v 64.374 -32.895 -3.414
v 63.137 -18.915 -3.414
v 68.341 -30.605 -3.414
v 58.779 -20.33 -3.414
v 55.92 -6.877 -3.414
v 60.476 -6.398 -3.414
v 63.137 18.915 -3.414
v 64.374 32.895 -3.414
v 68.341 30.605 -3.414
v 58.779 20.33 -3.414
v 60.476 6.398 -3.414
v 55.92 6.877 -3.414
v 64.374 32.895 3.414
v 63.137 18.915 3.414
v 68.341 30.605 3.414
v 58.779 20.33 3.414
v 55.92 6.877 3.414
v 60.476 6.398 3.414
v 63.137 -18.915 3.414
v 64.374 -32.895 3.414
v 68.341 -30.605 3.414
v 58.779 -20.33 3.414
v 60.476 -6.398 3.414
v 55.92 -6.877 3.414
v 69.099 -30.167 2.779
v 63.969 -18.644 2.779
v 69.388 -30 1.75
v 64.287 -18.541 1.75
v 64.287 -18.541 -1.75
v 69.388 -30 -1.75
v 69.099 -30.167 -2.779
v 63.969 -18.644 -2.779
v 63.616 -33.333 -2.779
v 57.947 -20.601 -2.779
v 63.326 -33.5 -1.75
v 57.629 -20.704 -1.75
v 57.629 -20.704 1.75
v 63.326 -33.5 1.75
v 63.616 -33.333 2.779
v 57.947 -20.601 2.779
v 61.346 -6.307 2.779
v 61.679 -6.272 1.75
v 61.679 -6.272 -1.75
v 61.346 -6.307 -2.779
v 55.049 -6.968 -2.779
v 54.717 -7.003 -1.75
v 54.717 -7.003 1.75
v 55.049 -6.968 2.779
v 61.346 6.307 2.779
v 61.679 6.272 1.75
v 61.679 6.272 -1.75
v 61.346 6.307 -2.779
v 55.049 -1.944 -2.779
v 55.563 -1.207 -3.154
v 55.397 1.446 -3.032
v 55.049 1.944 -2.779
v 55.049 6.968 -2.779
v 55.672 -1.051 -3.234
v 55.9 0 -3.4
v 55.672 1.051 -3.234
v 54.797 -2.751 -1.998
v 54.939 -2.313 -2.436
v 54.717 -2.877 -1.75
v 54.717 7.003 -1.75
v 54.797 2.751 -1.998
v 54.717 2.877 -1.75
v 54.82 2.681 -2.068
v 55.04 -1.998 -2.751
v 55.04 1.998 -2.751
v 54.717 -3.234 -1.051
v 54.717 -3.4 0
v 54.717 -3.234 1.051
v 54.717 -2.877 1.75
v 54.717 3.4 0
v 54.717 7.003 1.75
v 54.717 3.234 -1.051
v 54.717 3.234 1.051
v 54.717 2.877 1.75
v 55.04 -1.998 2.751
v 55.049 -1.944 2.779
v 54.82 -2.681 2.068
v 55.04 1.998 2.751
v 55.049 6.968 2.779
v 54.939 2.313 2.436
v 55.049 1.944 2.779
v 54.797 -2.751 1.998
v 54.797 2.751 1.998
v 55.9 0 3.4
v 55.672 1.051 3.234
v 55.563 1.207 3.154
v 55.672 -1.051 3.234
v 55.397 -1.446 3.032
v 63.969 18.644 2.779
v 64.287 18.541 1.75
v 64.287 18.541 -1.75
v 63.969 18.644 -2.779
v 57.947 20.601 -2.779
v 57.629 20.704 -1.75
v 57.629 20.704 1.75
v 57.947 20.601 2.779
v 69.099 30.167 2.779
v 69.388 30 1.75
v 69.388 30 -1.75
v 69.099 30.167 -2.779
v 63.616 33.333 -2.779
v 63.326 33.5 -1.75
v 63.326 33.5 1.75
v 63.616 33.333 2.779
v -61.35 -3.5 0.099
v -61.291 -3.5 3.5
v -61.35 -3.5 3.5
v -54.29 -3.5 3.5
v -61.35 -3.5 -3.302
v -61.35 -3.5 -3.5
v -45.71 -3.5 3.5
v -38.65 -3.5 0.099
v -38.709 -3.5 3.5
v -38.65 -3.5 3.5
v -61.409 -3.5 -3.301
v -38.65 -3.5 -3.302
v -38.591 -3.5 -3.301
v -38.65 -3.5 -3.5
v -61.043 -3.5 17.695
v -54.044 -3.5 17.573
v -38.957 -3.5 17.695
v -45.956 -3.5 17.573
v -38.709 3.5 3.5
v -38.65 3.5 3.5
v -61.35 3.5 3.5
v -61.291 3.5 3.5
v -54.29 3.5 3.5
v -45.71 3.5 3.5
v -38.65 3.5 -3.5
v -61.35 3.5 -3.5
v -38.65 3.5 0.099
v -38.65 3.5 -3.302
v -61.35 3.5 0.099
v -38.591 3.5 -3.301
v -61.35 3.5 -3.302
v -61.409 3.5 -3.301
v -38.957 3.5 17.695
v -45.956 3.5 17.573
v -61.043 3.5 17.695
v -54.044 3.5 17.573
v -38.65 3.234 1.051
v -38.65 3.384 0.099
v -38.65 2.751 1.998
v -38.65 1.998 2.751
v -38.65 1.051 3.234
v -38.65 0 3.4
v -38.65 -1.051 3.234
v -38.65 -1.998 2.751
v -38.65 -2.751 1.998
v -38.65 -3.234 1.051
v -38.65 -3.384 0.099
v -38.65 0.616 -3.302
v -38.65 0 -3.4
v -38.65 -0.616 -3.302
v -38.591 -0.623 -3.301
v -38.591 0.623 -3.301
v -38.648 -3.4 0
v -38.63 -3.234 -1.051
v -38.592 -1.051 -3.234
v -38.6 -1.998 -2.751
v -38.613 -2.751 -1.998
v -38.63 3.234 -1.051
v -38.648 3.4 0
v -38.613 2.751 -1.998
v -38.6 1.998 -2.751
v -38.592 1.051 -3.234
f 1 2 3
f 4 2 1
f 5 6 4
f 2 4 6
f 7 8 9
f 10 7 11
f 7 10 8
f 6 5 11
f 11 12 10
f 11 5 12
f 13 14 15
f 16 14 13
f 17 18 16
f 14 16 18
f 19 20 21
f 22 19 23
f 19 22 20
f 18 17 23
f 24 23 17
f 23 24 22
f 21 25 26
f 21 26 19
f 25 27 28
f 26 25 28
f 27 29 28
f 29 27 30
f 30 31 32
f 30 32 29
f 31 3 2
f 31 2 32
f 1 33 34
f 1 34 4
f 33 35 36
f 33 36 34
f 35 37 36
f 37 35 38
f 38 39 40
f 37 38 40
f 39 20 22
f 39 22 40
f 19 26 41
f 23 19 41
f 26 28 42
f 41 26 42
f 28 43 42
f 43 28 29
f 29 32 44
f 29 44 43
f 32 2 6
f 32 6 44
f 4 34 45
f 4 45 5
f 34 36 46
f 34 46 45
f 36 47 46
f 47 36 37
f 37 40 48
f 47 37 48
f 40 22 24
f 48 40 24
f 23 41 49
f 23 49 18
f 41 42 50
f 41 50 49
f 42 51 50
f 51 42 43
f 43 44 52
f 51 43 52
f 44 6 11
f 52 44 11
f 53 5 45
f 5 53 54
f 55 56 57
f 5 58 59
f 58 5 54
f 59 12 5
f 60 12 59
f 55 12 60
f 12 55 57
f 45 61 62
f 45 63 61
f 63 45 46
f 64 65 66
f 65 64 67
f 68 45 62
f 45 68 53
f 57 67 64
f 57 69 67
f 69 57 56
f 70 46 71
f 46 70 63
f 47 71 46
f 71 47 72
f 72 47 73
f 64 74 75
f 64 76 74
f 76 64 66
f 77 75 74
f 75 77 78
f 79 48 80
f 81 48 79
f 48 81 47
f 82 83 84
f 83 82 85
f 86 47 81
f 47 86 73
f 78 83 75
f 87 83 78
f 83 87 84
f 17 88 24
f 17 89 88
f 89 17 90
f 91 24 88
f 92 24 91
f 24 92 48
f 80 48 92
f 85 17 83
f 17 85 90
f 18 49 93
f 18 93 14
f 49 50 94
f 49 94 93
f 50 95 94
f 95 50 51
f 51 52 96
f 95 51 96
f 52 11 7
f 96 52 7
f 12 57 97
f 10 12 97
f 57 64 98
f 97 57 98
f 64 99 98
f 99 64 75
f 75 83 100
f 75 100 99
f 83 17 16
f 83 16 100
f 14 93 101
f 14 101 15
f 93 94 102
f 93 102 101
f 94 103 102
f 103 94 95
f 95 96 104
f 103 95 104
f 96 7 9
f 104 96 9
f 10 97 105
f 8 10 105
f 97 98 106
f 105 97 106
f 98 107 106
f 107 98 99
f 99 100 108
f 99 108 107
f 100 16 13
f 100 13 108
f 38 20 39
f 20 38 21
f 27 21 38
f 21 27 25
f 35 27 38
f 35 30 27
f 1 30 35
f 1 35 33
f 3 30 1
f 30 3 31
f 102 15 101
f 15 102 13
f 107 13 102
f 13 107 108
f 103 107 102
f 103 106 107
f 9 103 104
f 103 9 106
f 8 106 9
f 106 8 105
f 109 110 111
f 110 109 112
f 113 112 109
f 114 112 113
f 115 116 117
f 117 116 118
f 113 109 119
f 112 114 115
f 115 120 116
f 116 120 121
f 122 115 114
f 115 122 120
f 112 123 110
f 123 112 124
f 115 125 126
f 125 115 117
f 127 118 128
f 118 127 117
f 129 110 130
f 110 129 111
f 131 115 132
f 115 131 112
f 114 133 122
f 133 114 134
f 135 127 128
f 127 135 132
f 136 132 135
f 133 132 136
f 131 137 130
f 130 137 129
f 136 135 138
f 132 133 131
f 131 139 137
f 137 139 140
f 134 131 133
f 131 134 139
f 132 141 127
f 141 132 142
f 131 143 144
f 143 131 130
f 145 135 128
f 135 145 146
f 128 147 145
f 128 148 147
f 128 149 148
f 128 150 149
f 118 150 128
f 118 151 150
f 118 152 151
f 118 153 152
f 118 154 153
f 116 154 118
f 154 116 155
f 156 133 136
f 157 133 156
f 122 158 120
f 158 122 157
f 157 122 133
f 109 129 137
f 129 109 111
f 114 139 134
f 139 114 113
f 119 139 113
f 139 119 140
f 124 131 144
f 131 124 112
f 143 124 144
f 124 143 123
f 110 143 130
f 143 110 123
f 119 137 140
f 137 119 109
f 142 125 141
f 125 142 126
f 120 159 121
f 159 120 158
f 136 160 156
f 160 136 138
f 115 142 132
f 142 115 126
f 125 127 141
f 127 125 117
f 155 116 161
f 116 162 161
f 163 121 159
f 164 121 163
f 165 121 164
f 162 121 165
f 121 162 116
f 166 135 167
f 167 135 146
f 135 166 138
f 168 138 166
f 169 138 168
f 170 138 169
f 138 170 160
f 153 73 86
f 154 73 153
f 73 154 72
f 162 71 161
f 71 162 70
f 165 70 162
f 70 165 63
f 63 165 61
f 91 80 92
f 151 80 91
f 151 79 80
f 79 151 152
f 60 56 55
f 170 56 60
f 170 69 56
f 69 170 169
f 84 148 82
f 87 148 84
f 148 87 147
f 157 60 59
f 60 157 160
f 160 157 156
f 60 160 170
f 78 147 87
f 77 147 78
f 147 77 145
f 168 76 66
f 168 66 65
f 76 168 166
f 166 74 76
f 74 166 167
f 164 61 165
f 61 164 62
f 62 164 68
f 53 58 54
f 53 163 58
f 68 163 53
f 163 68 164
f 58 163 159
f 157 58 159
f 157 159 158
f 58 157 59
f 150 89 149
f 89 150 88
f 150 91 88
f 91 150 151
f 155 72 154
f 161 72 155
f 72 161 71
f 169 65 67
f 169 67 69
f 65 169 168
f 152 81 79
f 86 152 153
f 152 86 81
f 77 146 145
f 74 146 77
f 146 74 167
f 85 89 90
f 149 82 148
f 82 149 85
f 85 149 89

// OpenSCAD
// Thickness to print rod + clip etc
thickness = 7;
// Pole(+pad) length
distance  = 100;
// The width of your phone/device in mm
phone_width = 8.7;

stick_angle = 0;      // [-90:90]
phone_clip_angle = 2; // [0:5]

// Whether to print the circle segment pad on the end
with_pad = "yes";     // [yes,no]
// The angle of the circle segment to print
ring_angle = 60;      // [1:360]
// The Diameter of the pad ring
pad_diameter = 120;   

clip_height = thickness*3;

translate([-distance/2,0,0])
rotate([0,0,-90])
union(){
    cube([thickness,thickness*2+phone_width,thickness],true);
    rotate([-phone_clip_angle/2,0,0])
    translate([0,-((thickness+phone_width)/2),(clip_height-thickness)/2])
        cube([thickness,thickness,clip_height],true);
    rotate([phone_clip_angle/2,0,0])
    translate([0,((thickness+phone_width)/2),(clip_height-thickness)/2])
        cube([thickness,thickness,clip_height],true);
    rotate([stick_angle,0,0])
    translate([0,-0.1+thickness+(phone_width/2)])
    rotate([-90,0,0])
        if(with_pad=="yes"){
            cylinder(distance-thickness/2, thickness/2-0.1, thickness/2-0.1, $fn=20);
        } else {
            cylinder(distance, thickness/2-0.1, thickness/2-0.1, $fn=20);
        }
    if(with_pad == "yes"){
        rotate([stick_angle,0,0])
        translate([0,(pad_diameter/2)+(phone_width/2)+thickness+distance,0])
        rotate([0,0,-(90+(ring_angle/2))])
        partial_ring(ring_angle, pad_diameter/2)
        translate([thickness/2,0,0])
            basic_shape(thickness);
    }
}


module basic_shape(thickness) {
    minkowski(){
        square([thickness-thickness/2,thickness-thickness/2], true);
        circle(thickness/4, $fn=10);
    }
}

module partial_ring(angle, radius){
    intersection(){
        ring(radius)
            children(0);  
        translate([0,0,-50])
            linear_extrude(100)
                slice_of_pie(angle, radius*2);
    }
}

module ring(radius){
    rotate_extrude(){
        translate([radius, 0, 0]) children(0);
    }
}

module slice_of_pie(angle=90, r=1){
    if(angle<=90){
        intersection(){
            circle(r);
            polygon([[0,0 ], [cos(angle) * r * 2, sin(angle) * r*2],[r*2,0]]);
        }
    } else if(angle <= 180)  {
        intersection(){
            circle(r);
            polygon([[0,0], [r*2,0], [0,r*2], [cos(angle) * r * 2, sin(angle) * r*2]]);
        }
    } else {
        mirror([0,1,0])
        difference(){
            circle(r);
            slice_of_pie(360-angle, r);
        }
    }
}
